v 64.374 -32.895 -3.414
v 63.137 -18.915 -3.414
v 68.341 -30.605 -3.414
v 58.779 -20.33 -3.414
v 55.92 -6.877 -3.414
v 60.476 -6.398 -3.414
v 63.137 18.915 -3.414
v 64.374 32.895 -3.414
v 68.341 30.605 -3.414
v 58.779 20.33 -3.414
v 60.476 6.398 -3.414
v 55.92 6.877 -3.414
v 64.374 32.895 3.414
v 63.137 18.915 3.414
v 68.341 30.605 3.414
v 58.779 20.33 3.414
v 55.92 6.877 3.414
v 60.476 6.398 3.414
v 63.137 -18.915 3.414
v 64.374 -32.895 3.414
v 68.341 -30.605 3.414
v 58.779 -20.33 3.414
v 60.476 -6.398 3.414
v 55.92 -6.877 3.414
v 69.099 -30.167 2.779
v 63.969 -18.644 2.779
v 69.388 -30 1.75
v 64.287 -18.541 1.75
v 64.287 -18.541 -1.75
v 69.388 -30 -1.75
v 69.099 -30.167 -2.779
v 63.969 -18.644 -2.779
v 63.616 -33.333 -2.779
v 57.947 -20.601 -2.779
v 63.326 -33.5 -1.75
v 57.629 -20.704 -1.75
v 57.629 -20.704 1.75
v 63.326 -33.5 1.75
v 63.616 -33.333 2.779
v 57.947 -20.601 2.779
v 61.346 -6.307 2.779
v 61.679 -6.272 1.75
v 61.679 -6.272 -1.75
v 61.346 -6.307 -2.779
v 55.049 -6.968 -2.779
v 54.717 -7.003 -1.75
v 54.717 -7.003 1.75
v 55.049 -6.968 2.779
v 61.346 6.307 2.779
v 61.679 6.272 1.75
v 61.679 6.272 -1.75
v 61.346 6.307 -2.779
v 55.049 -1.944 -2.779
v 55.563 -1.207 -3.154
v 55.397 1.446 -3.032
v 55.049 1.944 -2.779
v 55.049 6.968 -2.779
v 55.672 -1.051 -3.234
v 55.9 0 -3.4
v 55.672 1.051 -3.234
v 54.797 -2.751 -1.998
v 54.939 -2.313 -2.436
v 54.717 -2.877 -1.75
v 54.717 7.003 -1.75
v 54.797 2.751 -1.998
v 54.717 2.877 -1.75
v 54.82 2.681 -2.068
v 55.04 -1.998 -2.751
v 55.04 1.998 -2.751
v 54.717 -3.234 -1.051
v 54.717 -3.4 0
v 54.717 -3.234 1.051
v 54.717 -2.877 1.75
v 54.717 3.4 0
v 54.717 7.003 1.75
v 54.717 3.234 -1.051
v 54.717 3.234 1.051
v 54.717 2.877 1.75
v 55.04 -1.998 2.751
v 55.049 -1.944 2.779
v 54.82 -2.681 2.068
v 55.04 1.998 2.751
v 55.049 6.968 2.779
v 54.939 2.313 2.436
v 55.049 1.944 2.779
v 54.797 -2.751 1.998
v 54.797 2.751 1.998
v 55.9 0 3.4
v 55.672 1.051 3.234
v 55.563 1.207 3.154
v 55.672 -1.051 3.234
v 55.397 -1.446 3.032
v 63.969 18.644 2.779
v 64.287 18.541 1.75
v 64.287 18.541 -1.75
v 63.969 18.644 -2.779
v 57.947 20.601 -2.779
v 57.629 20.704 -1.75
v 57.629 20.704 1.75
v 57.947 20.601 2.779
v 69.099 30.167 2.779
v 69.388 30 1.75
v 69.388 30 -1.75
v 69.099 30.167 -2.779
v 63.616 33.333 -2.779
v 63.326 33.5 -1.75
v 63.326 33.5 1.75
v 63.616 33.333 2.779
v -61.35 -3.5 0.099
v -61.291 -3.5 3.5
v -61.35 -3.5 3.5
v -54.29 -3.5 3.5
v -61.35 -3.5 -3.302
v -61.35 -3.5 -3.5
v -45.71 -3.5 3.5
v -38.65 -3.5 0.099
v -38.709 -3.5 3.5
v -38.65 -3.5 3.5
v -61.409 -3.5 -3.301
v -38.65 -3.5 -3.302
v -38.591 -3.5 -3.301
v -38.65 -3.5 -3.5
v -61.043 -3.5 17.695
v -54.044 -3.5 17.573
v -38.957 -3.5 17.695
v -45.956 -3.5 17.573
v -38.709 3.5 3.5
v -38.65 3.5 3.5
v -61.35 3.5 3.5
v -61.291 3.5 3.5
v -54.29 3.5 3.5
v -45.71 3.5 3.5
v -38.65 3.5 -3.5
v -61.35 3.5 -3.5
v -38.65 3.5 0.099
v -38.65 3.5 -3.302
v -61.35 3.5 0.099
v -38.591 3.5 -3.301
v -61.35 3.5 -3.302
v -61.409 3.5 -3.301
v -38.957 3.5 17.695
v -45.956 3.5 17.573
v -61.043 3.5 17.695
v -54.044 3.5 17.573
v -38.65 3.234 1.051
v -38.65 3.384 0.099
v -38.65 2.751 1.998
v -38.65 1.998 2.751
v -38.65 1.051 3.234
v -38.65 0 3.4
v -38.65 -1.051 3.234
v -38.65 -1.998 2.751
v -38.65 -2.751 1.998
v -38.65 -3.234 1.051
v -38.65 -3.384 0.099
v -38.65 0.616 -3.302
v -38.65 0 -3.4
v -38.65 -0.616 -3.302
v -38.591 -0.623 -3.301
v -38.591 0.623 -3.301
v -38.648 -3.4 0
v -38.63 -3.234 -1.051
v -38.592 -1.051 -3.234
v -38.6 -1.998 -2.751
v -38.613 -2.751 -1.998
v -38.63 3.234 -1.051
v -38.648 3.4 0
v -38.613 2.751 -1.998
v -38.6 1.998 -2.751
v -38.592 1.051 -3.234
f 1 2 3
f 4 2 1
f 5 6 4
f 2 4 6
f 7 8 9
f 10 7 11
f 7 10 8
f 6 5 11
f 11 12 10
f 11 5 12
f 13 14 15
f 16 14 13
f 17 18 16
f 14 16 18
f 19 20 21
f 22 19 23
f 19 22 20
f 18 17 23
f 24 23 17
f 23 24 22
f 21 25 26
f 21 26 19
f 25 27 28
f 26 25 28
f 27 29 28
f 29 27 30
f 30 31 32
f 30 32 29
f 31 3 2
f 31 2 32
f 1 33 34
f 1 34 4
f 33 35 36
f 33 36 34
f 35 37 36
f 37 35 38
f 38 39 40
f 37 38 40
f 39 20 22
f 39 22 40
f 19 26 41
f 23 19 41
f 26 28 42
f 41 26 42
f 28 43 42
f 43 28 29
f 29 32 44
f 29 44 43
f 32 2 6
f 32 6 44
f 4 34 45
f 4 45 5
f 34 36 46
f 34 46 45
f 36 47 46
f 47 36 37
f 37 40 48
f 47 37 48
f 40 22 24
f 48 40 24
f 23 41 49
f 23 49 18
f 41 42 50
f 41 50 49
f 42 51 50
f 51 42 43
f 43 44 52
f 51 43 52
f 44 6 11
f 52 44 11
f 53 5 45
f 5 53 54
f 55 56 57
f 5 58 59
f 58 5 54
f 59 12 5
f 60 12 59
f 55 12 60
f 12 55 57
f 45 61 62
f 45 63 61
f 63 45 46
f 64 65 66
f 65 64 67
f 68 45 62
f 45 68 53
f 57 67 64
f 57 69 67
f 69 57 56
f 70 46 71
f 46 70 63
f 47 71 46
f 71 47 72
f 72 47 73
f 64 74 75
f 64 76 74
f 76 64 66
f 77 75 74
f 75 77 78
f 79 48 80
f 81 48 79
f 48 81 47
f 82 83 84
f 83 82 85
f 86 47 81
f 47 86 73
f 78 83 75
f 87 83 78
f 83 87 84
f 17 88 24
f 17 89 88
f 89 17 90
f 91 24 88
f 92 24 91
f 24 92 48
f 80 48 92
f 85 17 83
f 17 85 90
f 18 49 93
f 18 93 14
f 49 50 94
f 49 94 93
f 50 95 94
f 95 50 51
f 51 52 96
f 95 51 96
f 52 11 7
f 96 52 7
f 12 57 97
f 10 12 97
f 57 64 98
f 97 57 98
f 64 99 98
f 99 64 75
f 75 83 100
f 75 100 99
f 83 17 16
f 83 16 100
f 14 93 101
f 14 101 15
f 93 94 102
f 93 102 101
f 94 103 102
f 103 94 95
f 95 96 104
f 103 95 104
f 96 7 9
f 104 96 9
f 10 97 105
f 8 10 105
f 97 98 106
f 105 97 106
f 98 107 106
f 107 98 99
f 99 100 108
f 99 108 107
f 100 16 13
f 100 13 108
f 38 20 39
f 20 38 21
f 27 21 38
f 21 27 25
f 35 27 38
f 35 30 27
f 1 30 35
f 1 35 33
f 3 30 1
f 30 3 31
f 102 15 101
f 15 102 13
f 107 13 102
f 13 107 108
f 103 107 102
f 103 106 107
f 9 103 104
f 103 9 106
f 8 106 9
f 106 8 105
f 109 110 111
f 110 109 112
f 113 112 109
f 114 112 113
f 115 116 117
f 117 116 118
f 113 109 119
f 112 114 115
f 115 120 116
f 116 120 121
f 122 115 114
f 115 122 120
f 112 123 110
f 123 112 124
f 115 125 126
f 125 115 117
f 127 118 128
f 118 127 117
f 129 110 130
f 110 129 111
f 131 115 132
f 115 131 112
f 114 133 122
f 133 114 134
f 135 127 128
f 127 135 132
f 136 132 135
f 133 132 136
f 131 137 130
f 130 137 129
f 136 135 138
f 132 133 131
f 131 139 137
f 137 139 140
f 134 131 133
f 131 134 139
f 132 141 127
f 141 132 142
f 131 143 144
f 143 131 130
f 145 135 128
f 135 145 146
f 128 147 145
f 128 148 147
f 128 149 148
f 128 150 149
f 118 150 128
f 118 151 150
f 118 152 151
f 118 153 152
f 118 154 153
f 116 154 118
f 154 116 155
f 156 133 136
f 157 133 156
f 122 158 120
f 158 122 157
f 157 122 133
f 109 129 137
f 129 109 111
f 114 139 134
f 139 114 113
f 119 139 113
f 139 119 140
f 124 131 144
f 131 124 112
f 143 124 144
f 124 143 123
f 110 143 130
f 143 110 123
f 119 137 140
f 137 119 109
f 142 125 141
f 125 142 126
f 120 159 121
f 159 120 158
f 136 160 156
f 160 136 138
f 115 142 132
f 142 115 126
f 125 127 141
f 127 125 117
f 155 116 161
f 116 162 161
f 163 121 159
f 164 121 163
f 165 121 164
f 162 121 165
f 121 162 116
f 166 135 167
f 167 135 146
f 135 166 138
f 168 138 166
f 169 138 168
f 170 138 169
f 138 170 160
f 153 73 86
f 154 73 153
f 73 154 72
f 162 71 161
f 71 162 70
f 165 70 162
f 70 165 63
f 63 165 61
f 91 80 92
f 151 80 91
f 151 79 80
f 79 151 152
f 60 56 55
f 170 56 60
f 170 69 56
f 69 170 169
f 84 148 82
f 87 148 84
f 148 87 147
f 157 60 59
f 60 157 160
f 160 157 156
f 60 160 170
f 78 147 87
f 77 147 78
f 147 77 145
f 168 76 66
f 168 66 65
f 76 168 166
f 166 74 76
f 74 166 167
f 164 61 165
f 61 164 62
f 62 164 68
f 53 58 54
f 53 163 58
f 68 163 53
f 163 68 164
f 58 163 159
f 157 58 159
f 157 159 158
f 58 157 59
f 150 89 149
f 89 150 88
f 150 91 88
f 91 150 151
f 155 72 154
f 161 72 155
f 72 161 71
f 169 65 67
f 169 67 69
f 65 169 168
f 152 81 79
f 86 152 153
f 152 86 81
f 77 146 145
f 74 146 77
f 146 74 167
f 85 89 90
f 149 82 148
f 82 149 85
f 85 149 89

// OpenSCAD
// Thickness to print rod + clip etc
thickness = 7;
// Pole(+pad) length
distance  = 100;
// The width of your phone/device in mm
phone_width = 8.7;

stick_angle = 0;      // [-90:90]
phone_clip_angle = 2; // [0:5]

// Whether to print the circle segment pad on the end
with_pad = "yes";     // [yes,no]
// The angle of the circle segment to print
ring_angle = 60;      // [1:360]
// The Diameter of the pad ring
pad_diameter = 120;   

clip_height = thickness*3;

translate([-distance/2,0,0])
rotate([0,0,-90])
union(){
    cube([thickness,thickness*2+phone_width,thickness],true);
    rotate([-phone_clip_angle/2,0,0])
    translate([0,-((thickness+phone_width)/2),(clip_height-thickness)/2])
        cube([thickness,thickness,clip_height],true);
    rotate([phone_clip_angle/2,0,0])
    translate([0,((thickness+phone_width)/2),(clip_height-thickness)/2])
        cube([thickness,thickness,clip_height],true);
    rotate([stick_angle,0,0])
    translate([0,-0.1+thickness+(phone_width/2)])
    rotate([-90,0,0])
        if(with_pad=="yes"){
            cylinder(distance-thickness/2, thickness/2-0.1, thickness/2-0.1, $fn=20);
        } else {
            cylinder(distance, thickness/2-0.1, thickness/2-0.1, $fn=20);
        }
    if(with_pad == "yes"){
        rotate([stick_angle,0,0])
        translate([0,(pad_diameter/2)+(phone_width/2)+thickness+distance,0])
        rotate([0,0,-(90+(ring_angle/2))])
        partial_ring(ring_angle, pad_diameter/2)
        translate([thickness/2,0,0])
            basic_shape(thickness);
    }
}


module basic_shape(thickness) {
    minkowski(){
        square([thickness-thickness/2,thickness-thickness/2], true);
        circle(thickness/4, $fn=10);
    }
}

module partial_ring(angle, radius){
    intersection(){
        ring(radius)
            children(0);  
        translate([0,0,-50])
            linear_extrude(100)
                slice_of_pie(angle, radius*2);
    }
}

module ring(radius){
    rotate_extrude(){
        translate([radius, 0, 0]) children(0);
    }
}

module slice_of_pie(angle=90, r=1){
    if(angle<=90){
        intersection(){
            circle(r);
            polygon([[0,0 ], [cos(angle) * r * 2, sin(angle) * r*2],[r*2,0]]);
        }
    } else if(angle <= 180)  {
        intersection(){
            circle(r);
            polygon([[0,0], [r*2,0], [0,r*2], [cos(angle) * r * 2, sin(angle) * r*2]]);
        }
    } else {
        mirror([0,1,0])
        difference(){
            circle(r);
            slice_of_pie(360-angle, r);
        }
    }
}
